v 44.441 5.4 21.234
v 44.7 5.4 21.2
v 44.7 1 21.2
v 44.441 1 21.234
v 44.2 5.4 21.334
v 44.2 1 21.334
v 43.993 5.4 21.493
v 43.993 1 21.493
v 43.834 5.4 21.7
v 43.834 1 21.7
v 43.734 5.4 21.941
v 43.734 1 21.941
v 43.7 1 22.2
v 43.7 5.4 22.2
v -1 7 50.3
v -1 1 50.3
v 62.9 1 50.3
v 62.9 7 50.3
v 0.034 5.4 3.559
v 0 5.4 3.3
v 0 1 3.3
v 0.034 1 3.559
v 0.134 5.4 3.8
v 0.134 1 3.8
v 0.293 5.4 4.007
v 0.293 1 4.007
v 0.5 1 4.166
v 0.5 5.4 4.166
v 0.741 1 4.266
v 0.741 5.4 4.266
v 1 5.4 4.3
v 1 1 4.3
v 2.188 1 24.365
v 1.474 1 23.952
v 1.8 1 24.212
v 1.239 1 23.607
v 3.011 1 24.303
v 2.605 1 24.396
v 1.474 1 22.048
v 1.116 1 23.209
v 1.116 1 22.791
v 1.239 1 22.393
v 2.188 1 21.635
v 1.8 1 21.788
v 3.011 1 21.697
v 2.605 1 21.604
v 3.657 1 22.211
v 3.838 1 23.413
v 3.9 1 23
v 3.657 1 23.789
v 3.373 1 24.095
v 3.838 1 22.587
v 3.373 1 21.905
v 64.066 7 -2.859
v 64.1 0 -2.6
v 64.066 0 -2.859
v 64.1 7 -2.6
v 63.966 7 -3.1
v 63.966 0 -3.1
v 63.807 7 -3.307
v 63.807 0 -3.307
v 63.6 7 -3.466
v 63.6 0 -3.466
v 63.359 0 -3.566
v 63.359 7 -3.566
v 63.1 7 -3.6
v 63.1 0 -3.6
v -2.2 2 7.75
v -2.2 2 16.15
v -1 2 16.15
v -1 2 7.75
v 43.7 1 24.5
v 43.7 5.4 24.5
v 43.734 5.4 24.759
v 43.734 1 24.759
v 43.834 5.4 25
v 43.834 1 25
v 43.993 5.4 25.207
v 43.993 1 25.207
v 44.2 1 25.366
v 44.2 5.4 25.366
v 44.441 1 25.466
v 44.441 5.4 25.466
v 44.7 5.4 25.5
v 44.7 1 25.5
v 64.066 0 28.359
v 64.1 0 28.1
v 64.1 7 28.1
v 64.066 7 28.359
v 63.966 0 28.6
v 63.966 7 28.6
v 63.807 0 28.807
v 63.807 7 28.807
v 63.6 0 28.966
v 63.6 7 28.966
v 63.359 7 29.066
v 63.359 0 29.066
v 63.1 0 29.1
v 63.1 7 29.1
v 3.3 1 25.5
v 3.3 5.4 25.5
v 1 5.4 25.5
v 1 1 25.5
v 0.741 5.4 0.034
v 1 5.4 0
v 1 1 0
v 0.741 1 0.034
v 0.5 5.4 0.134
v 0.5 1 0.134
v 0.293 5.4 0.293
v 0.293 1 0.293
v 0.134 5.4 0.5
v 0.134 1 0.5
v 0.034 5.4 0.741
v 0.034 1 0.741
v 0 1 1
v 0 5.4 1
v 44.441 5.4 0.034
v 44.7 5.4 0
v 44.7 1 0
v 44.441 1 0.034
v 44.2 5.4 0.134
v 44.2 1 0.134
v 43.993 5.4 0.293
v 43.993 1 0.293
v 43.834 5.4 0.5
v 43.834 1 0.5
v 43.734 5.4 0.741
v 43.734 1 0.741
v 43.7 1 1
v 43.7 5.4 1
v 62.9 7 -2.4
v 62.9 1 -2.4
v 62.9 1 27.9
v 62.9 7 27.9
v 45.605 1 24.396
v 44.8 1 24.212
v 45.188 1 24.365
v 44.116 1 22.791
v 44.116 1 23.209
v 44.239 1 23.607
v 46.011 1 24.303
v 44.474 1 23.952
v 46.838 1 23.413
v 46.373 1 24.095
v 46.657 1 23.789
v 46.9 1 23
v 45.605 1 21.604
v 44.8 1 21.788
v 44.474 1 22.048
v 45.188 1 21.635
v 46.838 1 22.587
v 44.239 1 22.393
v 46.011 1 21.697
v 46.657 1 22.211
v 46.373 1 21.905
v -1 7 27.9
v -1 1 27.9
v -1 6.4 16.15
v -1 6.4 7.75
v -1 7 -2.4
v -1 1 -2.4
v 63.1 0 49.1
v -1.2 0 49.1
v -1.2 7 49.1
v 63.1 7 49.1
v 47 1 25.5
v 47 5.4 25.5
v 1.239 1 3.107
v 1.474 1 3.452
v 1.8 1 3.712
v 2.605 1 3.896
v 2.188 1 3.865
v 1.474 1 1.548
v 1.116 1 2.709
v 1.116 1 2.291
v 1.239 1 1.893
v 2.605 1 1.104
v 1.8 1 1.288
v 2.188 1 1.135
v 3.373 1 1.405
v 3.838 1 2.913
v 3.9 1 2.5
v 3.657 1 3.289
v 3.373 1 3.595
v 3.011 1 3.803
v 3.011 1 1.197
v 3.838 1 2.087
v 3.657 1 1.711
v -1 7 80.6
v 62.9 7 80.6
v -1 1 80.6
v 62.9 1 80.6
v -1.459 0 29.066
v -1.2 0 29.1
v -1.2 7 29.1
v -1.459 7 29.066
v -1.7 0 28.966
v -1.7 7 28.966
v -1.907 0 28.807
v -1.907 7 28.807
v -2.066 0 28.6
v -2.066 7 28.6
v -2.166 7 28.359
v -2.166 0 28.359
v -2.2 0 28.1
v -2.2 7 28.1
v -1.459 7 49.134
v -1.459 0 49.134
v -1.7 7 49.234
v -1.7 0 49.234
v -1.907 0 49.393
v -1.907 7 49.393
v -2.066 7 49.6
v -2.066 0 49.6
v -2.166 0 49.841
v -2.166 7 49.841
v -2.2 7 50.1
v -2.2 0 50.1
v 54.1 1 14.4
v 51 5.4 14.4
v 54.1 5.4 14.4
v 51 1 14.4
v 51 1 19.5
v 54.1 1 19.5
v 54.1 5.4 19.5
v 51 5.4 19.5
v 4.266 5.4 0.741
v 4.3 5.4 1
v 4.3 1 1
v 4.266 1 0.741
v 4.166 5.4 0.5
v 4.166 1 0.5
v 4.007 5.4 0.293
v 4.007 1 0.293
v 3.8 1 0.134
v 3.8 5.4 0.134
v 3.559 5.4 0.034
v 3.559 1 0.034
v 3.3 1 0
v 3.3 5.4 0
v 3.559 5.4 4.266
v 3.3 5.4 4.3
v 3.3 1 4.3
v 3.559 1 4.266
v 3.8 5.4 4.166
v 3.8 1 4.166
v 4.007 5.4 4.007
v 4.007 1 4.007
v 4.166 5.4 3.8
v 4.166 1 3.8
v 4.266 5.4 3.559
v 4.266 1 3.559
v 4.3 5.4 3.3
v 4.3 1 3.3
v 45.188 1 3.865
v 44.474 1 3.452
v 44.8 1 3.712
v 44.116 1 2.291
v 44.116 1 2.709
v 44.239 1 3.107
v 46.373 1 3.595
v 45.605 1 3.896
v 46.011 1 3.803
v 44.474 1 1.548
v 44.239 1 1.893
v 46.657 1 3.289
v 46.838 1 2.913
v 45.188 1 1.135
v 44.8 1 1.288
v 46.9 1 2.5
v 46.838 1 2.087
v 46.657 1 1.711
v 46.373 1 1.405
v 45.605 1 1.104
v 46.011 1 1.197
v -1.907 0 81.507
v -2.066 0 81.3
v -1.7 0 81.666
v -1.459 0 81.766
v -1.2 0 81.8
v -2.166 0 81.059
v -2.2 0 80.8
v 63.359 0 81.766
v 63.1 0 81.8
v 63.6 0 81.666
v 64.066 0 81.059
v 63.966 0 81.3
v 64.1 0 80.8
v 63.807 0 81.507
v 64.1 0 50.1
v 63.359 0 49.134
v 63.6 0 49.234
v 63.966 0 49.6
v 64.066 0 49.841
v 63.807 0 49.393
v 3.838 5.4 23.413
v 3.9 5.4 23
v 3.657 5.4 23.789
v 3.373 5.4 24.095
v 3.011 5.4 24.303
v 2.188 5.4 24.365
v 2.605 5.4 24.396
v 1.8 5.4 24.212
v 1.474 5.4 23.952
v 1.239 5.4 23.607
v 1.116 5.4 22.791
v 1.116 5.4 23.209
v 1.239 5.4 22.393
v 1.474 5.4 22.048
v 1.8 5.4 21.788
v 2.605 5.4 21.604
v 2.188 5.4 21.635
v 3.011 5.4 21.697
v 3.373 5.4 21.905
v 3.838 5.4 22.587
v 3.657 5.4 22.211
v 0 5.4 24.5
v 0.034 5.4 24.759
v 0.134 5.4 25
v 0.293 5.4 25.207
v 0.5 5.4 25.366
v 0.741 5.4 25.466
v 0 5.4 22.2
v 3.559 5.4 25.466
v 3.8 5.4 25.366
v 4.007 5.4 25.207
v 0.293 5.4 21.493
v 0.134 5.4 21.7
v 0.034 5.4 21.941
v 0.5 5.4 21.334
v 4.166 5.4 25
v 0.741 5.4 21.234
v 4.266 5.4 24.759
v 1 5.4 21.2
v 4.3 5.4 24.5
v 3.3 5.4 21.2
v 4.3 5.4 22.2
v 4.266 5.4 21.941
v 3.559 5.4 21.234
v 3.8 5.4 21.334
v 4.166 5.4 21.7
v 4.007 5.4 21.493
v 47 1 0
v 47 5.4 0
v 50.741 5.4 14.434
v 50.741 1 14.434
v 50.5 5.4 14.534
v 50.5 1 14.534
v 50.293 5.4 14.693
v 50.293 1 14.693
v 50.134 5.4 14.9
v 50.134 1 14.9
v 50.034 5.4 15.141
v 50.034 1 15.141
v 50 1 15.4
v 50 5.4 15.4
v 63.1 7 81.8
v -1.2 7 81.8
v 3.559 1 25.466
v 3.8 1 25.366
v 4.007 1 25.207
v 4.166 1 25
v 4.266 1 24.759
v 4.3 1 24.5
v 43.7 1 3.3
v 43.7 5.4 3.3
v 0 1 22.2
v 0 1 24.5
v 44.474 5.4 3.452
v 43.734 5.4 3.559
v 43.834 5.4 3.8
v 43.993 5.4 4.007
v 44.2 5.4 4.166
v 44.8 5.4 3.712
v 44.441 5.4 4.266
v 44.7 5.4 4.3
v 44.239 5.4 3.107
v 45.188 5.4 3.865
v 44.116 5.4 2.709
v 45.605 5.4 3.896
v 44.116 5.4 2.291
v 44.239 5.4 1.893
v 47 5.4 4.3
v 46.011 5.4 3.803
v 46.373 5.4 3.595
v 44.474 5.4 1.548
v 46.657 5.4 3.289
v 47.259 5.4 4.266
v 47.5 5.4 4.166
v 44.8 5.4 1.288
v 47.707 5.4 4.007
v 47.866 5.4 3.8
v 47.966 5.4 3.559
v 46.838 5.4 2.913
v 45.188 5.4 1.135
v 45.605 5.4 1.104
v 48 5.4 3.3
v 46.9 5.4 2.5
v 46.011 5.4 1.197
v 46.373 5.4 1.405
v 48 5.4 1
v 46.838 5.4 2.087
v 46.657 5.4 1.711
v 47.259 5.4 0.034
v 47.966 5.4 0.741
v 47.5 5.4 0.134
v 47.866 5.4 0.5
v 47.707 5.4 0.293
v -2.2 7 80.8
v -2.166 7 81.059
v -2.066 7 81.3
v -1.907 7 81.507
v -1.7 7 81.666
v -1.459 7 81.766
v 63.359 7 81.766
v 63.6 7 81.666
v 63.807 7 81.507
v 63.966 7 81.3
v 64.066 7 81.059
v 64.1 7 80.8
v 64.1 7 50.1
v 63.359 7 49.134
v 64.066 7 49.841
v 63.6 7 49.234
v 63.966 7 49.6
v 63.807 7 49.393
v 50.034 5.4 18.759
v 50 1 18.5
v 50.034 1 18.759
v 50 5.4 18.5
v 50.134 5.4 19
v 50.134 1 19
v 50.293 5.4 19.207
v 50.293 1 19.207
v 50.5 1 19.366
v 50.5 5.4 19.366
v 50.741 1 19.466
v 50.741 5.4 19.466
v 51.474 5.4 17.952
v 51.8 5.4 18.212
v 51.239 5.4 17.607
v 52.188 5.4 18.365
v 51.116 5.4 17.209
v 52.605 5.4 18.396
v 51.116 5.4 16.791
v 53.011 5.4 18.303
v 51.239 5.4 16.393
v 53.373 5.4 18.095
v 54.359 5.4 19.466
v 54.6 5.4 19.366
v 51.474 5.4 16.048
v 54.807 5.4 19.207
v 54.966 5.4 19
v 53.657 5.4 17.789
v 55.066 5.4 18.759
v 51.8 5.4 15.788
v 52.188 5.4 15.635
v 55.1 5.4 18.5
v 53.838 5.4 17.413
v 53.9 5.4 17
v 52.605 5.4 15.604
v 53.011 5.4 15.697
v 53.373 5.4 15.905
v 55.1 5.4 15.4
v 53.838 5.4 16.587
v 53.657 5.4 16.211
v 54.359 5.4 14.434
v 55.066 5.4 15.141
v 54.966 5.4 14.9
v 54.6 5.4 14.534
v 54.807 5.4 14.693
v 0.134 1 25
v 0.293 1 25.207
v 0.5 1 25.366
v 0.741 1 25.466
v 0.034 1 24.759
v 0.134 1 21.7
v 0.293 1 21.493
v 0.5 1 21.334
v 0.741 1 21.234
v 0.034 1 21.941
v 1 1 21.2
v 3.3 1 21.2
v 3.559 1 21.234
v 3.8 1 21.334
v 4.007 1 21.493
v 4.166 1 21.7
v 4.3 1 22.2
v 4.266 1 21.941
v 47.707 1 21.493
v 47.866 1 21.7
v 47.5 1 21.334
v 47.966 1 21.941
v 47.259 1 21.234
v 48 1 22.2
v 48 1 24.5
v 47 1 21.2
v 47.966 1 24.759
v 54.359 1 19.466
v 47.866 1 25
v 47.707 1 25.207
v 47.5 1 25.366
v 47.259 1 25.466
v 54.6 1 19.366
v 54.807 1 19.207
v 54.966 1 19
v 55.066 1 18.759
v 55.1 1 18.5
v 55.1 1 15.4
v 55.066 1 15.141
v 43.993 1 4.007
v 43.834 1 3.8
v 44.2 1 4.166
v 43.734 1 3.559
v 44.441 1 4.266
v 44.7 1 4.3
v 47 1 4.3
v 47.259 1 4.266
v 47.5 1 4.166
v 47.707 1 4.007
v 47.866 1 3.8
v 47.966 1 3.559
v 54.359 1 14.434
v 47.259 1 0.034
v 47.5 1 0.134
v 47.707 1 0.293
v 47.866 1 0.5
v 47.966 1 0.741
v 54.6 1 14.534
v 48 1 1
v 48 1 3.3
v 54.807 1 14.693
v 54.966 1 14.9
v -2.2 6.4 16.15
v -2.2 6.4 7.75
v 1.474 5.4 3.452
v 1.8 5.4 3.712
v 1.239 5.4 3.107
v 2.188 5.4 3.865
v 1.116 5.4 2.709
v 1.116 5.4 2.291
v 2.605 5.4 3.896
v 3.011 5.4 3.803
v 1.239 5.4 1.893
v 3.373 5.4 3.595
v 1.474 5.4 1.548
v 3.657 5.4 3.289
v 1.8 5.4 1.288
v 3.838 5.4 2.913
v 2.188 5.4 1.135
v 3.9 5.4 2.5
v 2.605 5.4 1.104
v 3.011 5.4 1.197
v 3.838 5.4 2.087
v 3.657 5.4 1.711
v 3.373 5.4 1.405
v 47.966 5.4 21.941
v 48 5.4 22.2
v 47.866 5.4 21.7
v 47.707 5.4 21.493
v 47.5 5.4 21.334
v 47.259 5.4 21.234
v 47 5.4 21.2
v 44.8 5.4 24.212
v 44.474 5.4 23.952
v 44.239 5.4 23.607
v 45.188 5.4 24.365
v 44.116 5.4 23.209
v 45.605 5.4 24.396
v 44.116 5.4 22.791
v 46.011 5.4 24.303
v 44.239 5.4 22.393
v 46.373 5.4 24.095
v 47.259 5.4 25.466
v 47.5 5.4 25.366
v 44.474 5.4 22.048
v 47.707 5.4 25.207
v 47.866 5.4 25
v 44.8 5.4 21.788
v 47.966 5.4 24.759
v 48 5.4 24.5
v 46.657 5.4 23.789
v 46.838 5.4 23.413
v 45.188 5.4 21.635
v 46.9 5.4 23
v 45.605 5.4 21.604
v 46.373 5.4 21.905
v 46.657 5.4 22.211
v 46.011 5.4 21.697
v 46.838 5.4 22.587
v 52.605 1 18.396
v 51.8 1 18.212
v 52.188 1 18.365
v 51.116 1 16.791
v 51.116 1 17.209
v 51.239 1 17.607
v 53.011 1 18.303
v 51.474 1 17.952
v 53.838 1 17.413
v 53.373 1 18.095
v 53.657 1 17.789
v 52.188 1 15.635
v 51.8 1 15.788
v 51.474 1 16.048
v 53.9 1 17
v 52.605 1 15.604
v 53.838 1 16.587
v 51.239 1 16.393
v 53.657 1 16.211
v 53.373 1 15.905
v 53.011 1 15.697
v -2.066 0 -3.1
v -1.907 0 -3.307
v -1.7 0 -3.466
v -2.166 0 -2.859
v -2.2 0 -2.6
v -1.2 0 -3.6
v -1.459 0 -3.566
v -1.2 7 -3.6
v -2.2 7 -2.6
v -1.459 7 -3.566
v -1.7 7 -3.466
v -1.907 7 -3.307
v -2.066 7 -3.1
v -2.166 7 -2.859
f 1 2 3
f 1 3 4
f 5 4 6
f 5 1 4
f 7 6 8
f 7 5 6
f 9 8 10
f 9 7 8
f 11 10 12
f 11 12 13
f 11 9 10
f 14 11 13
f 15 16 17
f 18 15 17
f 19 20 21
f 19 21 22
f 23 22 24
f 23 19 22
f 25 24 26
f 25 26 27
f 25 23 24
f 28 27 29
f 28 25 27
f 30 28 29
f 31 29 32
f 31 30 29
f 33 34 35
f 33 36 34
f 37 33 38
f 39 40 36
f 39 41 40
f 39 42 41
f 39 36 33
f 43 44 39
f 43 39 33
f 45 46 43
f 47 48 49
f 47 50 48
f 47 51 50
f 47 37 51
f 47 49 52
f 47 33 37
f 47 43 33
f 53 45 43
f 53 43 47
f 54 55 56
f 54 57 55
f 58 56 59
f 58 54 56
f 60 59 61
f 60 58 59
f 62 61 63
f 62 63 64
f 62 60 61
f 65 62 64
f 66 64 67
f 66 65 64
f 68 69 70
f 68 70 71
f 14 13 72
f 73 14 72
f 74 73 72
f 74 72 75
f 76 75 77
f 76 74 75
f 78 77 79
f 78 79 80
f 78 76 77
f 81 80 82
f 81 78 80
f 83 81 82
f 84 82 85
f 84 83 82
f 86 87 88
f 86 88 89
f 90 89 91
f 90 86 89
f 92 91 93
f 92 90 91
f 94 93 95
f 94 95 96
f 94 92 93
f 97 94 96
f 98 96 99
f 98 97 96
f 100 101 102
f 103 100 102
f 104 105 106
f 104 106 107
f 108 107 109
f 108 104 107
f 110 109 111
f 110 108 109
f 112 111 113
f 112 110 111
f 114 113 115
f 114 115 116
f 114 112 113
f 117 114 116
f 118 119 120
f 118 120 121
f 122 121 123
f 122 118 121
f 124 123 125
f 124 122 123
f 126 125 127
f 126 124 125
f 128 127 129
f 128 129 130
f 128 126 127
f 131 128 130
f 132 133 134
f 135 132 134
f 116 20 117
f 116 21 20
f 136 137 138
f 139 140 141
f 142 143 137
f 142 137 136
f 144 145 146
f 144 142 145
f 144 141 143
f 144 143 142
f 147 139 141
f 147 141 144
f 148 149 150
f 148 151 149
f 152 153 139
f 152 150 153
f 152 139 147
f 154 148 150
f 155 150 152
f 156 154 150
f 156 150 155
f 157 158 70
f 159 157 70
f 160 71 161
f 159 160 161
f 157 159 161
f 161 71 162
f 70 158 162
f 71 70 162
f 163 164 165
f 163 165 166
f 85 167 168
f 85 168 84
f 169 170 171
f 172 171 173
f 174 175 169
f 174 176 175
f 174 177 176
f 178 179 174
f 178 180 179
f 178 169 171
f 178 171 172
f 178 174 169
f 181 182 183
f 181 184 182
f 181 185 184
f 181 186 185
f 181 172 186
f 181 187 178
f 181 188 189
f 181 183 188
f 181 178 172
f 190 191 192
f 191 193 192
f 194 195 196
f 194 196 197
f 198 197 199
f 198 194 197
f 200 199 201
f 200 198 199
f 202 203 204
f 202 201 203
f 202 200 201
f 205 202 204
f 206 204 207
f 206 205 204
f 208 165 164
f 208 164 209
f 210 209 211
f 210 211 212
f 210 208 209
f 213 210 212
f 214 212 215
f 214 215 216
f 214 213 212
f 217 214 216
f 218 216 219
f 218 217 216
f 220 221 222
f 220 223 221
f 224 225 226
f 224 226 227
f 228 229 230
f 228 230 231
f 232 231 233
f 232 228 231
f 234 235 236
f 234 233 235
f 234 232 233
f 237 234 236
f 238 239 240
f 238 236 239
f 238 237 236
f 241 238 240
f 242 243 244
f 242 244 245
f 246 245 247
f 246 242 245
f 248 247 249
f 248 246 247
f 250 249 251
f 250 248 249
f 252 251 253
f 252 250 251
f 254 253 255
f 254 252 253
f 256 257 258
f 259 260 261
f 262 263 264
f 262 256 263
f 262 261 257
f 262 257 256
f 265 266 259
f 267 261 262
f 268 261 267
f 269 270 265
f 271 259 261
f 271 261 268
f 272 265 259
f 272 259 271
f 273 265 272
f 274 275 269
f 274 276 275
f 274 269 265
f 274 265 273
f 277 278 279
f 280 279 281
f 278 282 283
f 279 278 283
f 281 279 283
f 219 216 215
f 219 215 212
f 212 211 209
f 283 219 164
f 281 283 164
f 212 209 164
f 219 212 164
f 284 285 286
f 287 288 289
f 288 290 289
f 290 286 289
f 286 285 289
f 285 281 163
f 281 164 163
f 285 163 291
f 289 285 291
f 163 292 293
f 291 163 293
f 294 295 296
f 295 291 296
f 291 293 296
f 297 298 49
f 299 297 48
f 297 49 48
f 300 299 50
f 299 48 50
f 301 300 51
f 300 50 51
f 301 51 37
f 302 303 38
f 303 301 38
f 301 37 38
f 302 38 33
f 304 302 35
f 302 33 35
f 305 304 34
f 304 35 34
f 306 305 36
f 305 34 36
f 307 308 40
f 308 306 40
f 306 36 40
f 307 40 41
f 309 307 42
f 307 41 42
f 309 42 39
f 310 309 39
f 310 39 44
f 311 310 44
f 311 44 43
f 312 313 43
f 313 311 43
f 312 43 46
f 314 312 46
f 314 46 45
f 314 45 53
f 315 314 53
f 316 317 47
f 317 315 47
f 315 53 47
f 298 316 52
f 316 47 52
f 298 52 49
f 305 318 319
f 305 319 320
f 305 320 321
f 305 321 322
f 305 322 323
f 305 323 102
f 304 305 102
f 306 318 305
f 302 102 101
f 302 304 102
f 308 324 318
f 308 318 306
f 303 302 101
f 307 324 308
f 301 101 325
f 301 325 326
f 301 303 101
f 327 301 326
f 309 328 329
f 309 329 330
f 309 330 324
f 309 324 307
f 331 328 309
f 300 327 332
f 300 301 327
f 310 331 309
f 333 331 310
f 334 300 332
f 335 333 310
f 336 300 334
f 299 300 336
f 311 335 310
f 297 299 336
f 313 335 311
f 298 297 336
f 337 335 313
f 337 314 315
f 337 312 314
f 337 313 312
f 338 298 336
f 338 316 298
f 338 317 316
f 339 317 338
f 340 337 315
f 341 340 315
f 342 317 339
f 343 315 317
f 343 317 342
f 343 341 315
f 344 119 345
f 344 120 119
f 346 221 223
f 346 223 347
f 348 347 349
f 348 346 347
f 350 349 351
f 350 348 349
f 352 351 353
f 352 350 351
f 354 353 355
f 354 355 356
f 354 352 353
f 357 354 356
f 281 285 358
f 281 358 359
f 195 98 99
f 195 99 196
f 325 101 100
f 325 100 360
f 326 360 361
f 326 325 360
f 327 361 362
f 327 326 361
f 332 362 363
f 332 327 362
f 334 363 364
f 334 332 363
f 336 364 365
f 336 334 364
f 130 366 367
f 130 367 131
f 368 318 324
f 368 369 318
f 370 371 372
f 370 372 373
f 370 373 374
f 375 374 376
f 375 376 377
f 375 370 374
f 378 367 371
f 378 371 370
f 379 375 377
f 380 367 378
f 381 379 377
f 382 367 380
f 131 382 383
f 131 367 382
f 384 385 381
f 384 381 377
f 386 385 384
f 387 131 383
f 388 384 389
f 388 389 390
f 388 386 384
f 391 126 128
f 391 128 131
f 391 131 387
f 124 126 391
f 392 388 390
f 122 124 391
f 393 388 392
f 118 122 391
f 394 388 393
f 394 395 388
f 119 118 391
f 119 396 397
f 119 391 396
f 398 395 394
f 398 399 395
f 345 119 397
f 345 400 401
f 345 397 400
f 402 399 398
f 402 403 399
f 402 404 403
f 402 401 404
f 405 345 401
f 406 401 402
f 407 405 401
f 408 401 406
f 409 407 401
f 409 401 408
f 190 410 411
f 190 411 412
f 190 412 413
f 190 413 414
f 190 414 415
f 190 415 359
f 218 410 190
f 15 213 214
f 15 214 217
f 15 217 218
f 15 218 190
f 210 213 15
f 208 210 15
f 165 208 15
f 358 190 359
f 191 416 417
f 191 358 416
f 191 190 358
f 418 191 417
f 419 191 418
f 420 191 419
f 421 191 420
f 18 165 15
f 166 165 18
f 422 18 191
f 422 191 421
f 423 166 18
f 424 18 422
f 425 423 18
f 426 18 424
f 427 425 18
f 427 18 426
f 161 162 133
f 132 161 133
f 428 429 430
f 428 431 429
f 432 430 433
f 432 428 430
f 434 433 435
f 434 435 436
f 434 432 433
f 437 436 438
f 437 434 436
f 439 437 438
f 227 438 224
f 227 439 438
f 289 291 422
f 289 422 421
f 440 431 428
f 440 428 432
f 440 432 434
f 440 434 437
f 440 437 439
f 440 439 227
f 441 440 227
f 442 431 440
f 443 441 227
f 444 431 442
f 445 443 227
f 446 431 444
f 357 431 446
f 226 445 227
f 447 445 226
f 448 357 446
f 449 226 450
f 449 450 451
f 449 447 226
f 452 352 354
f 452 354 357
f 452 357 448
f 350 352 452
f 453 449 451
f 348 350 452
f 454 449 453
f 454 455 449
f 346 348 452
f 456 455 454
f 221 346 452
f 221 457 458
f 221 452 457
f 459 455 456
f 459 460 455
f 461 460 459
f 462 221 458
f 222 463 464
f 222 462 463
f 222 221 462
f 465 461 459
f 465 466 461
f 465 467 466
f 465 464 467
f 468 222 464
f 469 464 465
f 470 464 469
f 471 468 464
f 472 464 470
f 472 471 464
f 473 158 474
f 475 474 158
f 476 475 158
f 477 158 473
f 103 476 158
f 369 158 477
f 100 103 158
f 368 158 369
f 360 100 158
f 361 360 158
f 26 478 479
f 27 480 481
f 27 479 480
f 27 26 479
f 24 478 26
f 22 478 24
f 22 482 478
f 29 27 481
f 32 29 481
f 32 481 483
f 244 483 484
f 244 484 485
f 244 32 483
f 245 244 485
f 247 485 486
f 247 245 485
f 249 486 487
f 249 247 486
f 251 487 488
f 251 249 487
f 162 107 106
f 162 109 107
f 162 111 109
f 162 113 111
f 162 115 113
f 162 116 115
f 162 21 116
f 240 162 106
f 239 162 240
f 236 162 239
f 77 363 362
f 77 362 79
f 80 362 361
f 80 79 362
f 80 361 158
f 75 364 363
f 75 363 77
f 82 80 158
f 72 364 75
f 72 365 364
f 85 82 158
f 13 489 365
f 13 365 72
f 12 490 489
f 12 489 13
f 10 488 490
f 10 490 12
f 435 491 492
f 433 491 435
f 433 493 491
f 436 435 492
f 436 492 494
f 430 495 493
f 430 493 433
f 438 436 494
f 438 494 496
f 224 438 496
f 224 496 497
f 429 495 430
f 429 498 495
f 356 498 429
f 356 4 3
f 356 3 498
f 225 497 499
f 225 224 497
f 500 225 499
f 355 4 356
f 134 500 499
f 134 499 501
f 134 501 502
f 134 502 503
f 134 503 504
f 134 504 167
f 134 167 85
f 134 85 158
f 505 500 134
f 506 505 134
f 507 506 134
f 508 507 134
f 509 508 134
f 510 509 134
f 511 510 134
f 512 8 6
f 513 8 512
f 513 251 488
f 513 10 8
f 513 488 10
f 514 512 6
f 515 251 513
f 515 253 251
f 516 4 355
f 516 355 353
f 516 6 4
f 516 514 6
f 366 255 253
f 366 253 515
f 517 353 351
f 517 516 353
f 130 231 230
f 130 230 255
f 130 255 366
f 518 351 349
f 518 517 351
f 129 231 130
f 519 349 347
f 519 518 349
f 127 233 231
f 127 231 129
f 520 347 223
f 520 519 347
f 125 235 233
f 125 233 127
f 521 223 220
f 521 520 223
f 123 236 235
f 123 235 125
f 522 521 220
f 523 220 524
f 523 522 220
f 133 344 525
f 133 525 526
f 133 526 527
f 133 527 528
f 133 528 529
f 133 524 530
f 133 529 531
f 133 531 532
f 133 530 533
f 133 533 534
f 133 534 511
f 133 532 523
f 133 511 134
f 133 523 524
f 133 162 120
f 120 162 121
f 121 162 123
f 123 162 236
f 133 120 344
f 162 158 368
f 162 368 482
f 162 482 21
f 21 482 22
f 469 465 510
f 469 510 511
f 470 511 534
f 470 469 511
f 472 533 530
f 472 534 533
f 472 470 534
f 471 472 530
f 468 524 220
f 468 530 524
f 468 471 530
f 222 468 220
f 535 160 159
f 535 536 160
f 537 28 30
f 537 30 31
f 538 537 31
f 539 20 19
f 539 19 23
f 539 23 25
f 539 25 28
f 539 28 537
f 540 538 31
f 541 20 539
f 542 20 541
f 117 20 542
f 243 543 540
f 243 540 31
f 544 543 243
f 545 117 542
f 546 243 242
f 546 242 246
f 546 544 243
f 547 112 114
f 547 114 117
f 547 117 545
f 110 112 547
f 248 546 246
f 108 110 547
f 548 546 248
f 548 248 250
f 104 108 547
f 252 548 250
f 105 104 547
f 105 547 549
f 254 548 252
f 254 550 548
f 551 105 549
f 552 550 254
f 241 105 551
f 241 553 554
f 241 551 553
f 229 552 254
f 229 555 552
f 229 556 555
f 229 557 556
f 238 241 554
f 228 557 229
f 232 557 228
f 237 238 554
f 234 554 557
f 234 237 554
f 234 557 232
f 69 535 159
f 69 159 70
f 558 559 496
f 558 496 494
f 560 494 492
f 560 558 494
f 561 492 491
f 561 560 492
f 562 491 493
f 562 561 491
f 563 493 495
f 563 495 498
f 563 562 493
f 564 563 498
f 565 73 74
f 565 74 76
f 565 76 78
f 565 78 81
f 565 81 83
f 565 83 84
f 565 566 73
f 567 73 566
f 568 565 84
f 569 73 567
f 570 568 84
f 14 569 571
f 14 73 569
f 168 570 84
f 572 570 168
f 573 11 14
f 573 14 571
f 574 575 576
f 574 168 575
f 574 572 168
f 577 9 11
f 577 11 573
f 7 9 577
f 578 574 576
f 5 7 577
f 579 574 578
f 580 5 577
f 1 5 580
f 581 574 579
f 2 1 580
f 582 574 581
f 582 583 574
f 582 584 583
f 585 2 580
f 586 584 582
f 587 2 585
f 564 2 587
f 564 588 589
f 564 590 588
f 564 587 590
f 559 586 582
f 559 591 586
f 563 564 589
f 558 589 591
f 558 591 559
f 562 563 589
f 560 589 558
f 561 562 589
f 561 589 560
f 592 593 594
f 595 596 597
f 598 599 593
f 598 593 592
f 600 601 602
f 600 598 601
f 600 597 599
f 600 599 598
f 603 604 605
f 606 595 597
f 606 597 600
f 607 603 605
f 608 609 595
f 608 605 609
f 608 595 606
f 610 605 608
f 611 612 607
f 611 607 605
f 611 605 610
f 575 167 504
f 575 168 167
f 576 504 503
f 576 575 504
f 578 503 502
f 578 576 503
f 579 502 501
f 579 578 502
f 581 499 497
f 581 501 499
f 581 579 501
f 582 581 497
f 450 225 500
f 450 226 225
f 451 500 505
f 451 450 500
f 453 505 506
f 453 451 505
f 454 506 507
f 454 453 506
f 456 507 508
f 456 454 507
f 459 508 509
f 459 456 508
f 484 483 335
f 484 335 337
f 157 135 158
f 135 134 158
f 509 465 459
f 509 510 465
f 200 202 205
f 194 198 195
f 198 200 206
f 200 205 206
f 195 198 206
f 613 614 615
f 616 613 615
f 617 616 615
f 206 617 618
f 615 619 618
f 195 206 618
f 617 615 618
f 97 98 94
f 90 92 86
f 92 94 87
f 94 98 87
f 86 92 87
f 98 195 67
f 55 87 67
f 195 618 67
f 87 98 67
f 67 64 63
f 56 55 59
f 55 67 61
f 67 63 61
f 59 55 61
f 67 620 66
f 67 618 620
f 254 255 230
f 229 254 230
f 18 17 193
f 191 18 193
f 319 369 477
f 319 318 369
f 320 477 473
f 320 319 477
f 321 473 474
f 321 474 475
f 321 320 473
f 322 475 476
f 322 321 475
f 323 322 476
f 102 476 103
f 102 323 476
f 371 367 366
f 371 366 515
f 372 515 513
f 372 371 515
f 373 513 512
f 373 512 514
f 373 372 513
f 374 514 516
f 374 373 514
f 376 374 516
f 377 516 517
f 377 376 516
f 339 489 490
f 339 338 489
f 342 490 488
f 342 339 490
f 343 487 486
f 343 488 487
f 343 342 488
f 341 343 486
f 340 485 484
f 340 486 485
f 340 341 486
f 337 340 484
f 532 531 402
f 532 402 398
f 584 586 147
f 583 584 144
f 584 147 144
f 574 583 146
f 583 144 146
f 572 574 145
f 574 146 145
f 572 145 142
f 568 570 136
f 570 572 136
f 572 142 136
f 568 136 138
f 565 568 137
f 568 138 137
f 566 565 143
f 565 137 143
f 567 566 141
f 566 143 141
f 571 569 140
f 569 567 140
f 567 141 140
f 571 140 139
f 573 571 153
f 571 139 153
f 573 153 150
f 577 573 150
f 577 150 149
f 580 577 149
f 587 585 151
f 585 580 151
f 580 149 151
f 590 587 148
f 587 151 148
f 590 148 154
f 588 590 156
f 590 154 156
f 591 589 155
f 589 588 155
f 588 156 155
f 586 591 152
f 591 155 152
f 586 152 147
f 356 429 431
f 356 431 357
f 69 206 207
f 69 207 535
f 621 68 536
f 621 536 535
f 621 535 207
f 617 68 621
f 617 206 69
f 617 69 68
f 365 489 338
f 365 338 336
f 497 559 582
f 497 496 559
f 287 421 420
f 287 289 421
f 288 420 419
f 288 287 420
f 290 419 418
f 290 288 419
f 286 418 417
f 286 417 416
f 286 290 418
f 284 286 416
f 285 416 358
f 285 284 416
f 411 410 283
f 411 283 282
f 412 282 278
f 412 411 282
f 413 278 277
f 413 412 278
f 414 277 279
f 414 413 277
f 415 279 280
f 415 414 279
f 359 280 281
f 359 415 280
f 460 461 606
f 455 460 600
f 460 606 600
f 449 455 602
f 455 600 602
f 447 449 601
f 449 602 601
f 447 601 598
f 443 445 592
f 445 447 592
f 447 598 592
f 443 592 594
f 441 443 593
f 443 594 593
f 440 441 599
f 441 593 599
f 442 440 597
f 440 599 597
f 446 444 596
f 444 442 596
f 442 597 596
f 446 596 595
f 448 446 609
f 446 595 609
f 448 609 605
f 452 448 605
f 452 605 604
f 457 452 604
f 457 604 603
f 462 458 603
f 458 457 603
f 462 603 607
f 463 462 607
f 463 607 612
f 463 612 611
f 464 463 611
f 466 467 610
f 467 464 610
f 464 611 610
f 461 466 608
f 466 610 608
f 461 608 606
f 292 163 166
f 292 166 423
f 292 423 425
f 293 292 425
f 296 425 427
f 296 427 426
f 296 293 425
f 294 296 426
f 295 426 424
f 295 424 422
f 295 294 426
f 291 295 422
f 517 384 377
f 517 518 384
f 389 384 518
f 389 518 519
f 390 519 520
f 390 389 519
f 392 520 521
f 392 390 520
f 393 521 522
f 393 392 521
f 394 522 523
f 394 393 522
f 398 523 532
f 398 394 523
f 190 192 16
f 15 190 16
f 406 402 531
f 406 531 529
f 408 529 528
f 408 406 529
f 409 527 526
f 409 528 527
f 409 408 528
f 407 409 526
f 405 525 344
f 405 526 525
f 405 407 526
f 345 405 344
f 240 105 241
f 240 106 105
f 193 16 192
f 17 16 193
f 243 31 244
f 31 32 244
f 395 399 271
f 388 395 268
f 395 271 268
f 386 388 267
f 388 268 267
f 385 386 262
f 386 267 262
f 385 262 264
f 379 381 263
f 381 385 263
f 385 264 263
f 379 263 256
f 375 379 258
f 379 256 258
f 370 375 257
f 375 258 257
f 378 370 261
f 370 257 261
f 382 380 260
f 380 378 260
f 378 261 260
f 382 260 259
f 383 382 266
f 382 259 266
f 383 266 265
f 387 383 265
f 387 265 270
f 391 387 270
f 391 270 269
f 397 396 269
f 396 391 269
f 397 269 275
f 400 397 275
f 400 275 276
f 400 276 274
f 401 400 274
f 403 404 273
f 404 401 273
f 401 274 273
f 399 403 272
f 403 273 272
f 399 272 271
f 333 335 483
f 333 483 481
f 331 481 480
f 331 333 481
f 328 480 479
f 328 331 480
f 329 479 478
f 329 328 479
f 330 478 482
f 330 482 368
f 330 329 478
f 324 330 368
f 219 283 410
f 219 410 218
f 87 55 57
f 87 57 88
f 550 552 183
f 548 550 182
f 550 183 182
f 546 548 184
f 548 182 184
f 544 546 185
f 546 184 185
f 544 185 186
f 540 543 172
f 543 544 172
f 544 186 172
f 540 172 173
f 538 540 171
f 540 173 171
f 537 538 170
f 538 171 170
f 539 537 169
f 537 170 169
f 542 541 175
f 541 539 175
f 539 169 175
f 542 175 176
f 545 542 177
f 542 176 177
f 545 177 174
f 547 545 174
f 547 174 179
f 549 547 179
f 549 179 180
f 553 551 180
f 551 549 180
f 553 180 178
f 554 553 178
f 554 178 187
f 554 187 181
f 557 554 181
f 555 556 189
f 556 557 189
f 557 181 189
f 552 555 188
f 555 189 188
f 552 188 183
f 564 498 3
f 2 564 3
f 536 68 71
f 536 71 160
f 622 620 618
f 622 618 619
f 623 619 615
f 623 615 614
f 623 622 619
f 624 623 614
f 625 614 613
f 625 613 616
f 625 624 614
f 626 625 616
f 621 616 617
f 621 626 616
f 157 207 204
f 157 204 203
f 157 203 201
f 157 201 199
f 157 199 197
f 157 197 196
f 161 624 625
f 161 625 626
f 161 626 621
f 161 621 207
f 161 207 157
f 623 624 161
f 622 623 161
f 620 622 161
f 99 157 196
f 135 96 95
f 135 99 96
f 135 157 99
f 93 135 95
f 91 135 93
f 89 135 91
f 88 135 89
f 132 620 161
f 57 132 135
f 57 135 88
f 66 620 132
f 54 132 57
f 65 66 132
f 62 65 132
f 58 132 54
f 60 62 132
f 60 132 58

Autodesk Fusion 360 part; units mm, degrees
sketch "Skizze1" plane through (0, 0, 0) normal (0, 1, 0) x (1, 0, 0)
  line L0 (0, 0) -> (48, 0)
  line L1 (48, 0) -> (48, -25.5)
  line L2 (48, -25.5) -> (0, -25.5)
  line L3 (0, -25.5) -> (0, 0)
  circle A0 centre (45.5, -2.5) radius 1.4
  line L4 (24, 5) -> (24, -28) construction
  line L5 (-2.2203, -12.75) -> (51, -12.75) construction
  circle A1 centre (45.5, -23) radius 1.4
  circle A2 centre (2.5, -2.5) radius 1.4
  circle A3 centre (2.5, -23) radius 1.4
  line L6 (50, -6) -> (60.5, -6)
  line L7 (60.5, -6) -> (60.5, -19.5)
  line L8 (60.5, -19.5) -> (50, -19.5)
  line L9 (50, -19.5) -> (50, -6)
  circle A4 centre (52.5, -17) radius 1.4
  line L10 (-1, 2.4) -> (62.9, 2.4)
  line L11 (62.9, 2.4) -> (62.9, -27.9)
  line L12 (62.9, -27.9) -> (-1, -27.9)
  line L13 (-1, -27.9) -> (-1, 2.4)
  line L14 (64.1, 3.6) -> (64.1, -29.1)
  line L15 (64.1, -29.1) -> (-2.2, -29.1)
  line L16 (-2.2, -29.1) -> (-2.2, 3.6)
  line L17 (-2.2, 3.6) -> (64.1, 3.6)
  line L18 (48, -4.3) -> (43.7, -4.3)
  line L19 (43.7, -4.3) -> (43.7, 0)
  line L20 (43.7, -21.2) -> (43.7, -25.5)
  line L21 (48, -21.2) -> (43.7, -21.2)
  line L22 (0, -4.3) -> (4.3, -4.3)
  line L23 (4.3, -4.3) -> (4.3, 0)
  line L24 (0, -21.2) -> (4.3, -21.2)
  line L25 (4.3, -21.2) -> (4.3, -25.5)
  line L26 (50, -14.4) -> (55.1, -14.4)
  line L27 (55.1, -14.4) -> (55.1, -19.5)
  line L28 (-2.2, -49.1) -> (64.1, -49.1)
  line L29 (64.1, -49.1) -> (64.1, -81.8)
  line L30 (64.1, -81.8) -> (-2.2, -81.8)
  line L31 (-2.2, -81.8) -> (-2.2, -49.1)
  line L32 (62.9, -80.6) -> (-1, -80.6)
  line L33 (-1, -80.6) -> (-1, -50.3)
  line L34 (-1, -50.3) -> (62.9, -50.3)
  line L35 (62.9, -50.3) -> (62.9, -80.6)
  dimension "d1" = 48
  dimension "d2" = 25.5
  dimension "d3" = 2.8
  dimension "d4" = 2.5
  dimension "d5" = 2.5
  dimension "d6" = 24
  dimension "d7" = 12.75
  dimension "d8" = 13.5
  dimension "d9" = 10.5
  dimension "d10" = 2.8
  dimension "d11" = 2.5
  dimension "d12" = 2.5
  dimension "d13" = 6
  dimension "d14" = 2
  dimension "d15" = 1
  dimension "d16" = 2.4
  dimension "d17" = 2.4
  dimension "d18" = 2.4
  dimension "d19" = -1.2
  dimension "d20" = 4.3
  dimension "d21" = 4.3
  dimension "d22" = 5.1
  dimension "d24" = 5.1
  dimension "d41" = 67.7
  dimension "d42" = 32.7
  dimension "d44" = 20
  dimension "d45" = 1.2
extrude "Extrusion1" add sketch "Skizze1" along normal blind 1 contours L0 L3 L22 L23 | L0 L1 L2 L3 L18 L19 L20 L21 L22 L23 L24 L25 | L0 L1 L18 L19 | L2 L3 L24 L25 | L1 L2 L20 L21 | A0 | A1 | A2 | A3 | L6 L7 L8 L9 L26 L27 | L8 L9 L26 L27 | A4 | L10 L11 L12 L13 | L14 L15 L16 L17 | L28 L29 L30 L31 | L32 L33 L34 L35 makes body 1 at (19.9, 0, 18.2) makes body 2 at (19.9, 0, 60)
extrude "Extrusion2" add sketch "Skizze1" along normal blind 7 contours L14 L15 L16 L17 bodies 1
extrude "Extrusion3" add sketch "Skizze1" along normal blind 5.4 contours L0 L3 L22 L23 | L0 L1 L18 L19 | L2 L3 L24 L25 | L1 L2 L20 L21 | L8 L9 L26 L27 bodies 1
sketch "Skizze2" plane through (-2.2, 0, 0) normal (-1, 0, 0) x (0, 0, 1)
  line L0 (-3.6, 0) -> (29.1, 0)
  line L1 (29.1, 0) -> (29.1, 7)
  line L2 (29.1, 7) -> (-3.6, 7)
  line L3 (-3.6, 7) -> (-3.6, 0)
  line L4 (7.75, 6.4) -> (16.15, 6.4)
  line L5 (16.15, 6.4) -> (16.15, 2)
  line L6 (16.15, 2) -> (7.75, 2)
  line L7 (7.75, 2) -> (7.75, 6.4)
  line L8 (29.1, 0) -> (-3.6, 0)
  dimension "d31" = 8.4
  dimension "d32" = 4.4
  dimension "d34" = 2
  dimension "d35" = 34.3
  dimension "d36" = 12.95
extrude "Extrusion4" cut sketch "Skizze2" against normal up to surface (1.2 mm away) contours L4 L5 L6 L7 bodies 1
extrude "Extrude5" add sketch "Skizze1" along normal blind 7 contours L28 L29 L30 L31 bodies 2
fillet "Abrundung1" radius 1 24 edges at (64.1, 3.5, -3.6) (-2.2, 3.5, -3.6) (0, 3.2, 0) (4.3, 3.2, 0) (43.7, 3.2, 0) (48, 3.2, 0) (50, 3.2, 14.4) (55.1, 3.2, 14.4) (48, 3.2, 21.2) (43.7, 3.2, 21.2) (4.3, 3.2, 21.2) (0, 3.2, 21.2) (-2.2, 3.5, 29.1) (64.1, 3.5, 29.1) (55.1, 3.2, 19.5) (50, 3.2, 19.5) (48, 3.2, 25.5) (43.7, 3.2, 25.5) (4.3, 3.2, 25.5) (0, 3.2, 25.5) (4.3, 3.2, 4.3) (0, 3.2, 4.3) (43.7, 3.2, 4.3) (48, 3.2, 4.3) on bodies 1 2
fillet "Abrundung1" radius 1 4 edges at (-2.2, 3.5, 81.8) (-2.2, 3.5, 49.1) (64.1, 3.5, 81.8) (64.1, 3.5, 49.1) on bodies 1 2
equation "d6 = d1 / 2"
equation "d7 = d2 / 2"
equation "d13 = ( d2 - d8 ) / 2"
equation "d20 = d5 + d3 / 2 + 0.4 mm"
equation "d21 = d20"
equation "d22 = d11 + d10 / 2 + 1.2 mm"
equation "d24 = d22"
equation "d36 = ( 34.30 mm - d31 ) / 2"
